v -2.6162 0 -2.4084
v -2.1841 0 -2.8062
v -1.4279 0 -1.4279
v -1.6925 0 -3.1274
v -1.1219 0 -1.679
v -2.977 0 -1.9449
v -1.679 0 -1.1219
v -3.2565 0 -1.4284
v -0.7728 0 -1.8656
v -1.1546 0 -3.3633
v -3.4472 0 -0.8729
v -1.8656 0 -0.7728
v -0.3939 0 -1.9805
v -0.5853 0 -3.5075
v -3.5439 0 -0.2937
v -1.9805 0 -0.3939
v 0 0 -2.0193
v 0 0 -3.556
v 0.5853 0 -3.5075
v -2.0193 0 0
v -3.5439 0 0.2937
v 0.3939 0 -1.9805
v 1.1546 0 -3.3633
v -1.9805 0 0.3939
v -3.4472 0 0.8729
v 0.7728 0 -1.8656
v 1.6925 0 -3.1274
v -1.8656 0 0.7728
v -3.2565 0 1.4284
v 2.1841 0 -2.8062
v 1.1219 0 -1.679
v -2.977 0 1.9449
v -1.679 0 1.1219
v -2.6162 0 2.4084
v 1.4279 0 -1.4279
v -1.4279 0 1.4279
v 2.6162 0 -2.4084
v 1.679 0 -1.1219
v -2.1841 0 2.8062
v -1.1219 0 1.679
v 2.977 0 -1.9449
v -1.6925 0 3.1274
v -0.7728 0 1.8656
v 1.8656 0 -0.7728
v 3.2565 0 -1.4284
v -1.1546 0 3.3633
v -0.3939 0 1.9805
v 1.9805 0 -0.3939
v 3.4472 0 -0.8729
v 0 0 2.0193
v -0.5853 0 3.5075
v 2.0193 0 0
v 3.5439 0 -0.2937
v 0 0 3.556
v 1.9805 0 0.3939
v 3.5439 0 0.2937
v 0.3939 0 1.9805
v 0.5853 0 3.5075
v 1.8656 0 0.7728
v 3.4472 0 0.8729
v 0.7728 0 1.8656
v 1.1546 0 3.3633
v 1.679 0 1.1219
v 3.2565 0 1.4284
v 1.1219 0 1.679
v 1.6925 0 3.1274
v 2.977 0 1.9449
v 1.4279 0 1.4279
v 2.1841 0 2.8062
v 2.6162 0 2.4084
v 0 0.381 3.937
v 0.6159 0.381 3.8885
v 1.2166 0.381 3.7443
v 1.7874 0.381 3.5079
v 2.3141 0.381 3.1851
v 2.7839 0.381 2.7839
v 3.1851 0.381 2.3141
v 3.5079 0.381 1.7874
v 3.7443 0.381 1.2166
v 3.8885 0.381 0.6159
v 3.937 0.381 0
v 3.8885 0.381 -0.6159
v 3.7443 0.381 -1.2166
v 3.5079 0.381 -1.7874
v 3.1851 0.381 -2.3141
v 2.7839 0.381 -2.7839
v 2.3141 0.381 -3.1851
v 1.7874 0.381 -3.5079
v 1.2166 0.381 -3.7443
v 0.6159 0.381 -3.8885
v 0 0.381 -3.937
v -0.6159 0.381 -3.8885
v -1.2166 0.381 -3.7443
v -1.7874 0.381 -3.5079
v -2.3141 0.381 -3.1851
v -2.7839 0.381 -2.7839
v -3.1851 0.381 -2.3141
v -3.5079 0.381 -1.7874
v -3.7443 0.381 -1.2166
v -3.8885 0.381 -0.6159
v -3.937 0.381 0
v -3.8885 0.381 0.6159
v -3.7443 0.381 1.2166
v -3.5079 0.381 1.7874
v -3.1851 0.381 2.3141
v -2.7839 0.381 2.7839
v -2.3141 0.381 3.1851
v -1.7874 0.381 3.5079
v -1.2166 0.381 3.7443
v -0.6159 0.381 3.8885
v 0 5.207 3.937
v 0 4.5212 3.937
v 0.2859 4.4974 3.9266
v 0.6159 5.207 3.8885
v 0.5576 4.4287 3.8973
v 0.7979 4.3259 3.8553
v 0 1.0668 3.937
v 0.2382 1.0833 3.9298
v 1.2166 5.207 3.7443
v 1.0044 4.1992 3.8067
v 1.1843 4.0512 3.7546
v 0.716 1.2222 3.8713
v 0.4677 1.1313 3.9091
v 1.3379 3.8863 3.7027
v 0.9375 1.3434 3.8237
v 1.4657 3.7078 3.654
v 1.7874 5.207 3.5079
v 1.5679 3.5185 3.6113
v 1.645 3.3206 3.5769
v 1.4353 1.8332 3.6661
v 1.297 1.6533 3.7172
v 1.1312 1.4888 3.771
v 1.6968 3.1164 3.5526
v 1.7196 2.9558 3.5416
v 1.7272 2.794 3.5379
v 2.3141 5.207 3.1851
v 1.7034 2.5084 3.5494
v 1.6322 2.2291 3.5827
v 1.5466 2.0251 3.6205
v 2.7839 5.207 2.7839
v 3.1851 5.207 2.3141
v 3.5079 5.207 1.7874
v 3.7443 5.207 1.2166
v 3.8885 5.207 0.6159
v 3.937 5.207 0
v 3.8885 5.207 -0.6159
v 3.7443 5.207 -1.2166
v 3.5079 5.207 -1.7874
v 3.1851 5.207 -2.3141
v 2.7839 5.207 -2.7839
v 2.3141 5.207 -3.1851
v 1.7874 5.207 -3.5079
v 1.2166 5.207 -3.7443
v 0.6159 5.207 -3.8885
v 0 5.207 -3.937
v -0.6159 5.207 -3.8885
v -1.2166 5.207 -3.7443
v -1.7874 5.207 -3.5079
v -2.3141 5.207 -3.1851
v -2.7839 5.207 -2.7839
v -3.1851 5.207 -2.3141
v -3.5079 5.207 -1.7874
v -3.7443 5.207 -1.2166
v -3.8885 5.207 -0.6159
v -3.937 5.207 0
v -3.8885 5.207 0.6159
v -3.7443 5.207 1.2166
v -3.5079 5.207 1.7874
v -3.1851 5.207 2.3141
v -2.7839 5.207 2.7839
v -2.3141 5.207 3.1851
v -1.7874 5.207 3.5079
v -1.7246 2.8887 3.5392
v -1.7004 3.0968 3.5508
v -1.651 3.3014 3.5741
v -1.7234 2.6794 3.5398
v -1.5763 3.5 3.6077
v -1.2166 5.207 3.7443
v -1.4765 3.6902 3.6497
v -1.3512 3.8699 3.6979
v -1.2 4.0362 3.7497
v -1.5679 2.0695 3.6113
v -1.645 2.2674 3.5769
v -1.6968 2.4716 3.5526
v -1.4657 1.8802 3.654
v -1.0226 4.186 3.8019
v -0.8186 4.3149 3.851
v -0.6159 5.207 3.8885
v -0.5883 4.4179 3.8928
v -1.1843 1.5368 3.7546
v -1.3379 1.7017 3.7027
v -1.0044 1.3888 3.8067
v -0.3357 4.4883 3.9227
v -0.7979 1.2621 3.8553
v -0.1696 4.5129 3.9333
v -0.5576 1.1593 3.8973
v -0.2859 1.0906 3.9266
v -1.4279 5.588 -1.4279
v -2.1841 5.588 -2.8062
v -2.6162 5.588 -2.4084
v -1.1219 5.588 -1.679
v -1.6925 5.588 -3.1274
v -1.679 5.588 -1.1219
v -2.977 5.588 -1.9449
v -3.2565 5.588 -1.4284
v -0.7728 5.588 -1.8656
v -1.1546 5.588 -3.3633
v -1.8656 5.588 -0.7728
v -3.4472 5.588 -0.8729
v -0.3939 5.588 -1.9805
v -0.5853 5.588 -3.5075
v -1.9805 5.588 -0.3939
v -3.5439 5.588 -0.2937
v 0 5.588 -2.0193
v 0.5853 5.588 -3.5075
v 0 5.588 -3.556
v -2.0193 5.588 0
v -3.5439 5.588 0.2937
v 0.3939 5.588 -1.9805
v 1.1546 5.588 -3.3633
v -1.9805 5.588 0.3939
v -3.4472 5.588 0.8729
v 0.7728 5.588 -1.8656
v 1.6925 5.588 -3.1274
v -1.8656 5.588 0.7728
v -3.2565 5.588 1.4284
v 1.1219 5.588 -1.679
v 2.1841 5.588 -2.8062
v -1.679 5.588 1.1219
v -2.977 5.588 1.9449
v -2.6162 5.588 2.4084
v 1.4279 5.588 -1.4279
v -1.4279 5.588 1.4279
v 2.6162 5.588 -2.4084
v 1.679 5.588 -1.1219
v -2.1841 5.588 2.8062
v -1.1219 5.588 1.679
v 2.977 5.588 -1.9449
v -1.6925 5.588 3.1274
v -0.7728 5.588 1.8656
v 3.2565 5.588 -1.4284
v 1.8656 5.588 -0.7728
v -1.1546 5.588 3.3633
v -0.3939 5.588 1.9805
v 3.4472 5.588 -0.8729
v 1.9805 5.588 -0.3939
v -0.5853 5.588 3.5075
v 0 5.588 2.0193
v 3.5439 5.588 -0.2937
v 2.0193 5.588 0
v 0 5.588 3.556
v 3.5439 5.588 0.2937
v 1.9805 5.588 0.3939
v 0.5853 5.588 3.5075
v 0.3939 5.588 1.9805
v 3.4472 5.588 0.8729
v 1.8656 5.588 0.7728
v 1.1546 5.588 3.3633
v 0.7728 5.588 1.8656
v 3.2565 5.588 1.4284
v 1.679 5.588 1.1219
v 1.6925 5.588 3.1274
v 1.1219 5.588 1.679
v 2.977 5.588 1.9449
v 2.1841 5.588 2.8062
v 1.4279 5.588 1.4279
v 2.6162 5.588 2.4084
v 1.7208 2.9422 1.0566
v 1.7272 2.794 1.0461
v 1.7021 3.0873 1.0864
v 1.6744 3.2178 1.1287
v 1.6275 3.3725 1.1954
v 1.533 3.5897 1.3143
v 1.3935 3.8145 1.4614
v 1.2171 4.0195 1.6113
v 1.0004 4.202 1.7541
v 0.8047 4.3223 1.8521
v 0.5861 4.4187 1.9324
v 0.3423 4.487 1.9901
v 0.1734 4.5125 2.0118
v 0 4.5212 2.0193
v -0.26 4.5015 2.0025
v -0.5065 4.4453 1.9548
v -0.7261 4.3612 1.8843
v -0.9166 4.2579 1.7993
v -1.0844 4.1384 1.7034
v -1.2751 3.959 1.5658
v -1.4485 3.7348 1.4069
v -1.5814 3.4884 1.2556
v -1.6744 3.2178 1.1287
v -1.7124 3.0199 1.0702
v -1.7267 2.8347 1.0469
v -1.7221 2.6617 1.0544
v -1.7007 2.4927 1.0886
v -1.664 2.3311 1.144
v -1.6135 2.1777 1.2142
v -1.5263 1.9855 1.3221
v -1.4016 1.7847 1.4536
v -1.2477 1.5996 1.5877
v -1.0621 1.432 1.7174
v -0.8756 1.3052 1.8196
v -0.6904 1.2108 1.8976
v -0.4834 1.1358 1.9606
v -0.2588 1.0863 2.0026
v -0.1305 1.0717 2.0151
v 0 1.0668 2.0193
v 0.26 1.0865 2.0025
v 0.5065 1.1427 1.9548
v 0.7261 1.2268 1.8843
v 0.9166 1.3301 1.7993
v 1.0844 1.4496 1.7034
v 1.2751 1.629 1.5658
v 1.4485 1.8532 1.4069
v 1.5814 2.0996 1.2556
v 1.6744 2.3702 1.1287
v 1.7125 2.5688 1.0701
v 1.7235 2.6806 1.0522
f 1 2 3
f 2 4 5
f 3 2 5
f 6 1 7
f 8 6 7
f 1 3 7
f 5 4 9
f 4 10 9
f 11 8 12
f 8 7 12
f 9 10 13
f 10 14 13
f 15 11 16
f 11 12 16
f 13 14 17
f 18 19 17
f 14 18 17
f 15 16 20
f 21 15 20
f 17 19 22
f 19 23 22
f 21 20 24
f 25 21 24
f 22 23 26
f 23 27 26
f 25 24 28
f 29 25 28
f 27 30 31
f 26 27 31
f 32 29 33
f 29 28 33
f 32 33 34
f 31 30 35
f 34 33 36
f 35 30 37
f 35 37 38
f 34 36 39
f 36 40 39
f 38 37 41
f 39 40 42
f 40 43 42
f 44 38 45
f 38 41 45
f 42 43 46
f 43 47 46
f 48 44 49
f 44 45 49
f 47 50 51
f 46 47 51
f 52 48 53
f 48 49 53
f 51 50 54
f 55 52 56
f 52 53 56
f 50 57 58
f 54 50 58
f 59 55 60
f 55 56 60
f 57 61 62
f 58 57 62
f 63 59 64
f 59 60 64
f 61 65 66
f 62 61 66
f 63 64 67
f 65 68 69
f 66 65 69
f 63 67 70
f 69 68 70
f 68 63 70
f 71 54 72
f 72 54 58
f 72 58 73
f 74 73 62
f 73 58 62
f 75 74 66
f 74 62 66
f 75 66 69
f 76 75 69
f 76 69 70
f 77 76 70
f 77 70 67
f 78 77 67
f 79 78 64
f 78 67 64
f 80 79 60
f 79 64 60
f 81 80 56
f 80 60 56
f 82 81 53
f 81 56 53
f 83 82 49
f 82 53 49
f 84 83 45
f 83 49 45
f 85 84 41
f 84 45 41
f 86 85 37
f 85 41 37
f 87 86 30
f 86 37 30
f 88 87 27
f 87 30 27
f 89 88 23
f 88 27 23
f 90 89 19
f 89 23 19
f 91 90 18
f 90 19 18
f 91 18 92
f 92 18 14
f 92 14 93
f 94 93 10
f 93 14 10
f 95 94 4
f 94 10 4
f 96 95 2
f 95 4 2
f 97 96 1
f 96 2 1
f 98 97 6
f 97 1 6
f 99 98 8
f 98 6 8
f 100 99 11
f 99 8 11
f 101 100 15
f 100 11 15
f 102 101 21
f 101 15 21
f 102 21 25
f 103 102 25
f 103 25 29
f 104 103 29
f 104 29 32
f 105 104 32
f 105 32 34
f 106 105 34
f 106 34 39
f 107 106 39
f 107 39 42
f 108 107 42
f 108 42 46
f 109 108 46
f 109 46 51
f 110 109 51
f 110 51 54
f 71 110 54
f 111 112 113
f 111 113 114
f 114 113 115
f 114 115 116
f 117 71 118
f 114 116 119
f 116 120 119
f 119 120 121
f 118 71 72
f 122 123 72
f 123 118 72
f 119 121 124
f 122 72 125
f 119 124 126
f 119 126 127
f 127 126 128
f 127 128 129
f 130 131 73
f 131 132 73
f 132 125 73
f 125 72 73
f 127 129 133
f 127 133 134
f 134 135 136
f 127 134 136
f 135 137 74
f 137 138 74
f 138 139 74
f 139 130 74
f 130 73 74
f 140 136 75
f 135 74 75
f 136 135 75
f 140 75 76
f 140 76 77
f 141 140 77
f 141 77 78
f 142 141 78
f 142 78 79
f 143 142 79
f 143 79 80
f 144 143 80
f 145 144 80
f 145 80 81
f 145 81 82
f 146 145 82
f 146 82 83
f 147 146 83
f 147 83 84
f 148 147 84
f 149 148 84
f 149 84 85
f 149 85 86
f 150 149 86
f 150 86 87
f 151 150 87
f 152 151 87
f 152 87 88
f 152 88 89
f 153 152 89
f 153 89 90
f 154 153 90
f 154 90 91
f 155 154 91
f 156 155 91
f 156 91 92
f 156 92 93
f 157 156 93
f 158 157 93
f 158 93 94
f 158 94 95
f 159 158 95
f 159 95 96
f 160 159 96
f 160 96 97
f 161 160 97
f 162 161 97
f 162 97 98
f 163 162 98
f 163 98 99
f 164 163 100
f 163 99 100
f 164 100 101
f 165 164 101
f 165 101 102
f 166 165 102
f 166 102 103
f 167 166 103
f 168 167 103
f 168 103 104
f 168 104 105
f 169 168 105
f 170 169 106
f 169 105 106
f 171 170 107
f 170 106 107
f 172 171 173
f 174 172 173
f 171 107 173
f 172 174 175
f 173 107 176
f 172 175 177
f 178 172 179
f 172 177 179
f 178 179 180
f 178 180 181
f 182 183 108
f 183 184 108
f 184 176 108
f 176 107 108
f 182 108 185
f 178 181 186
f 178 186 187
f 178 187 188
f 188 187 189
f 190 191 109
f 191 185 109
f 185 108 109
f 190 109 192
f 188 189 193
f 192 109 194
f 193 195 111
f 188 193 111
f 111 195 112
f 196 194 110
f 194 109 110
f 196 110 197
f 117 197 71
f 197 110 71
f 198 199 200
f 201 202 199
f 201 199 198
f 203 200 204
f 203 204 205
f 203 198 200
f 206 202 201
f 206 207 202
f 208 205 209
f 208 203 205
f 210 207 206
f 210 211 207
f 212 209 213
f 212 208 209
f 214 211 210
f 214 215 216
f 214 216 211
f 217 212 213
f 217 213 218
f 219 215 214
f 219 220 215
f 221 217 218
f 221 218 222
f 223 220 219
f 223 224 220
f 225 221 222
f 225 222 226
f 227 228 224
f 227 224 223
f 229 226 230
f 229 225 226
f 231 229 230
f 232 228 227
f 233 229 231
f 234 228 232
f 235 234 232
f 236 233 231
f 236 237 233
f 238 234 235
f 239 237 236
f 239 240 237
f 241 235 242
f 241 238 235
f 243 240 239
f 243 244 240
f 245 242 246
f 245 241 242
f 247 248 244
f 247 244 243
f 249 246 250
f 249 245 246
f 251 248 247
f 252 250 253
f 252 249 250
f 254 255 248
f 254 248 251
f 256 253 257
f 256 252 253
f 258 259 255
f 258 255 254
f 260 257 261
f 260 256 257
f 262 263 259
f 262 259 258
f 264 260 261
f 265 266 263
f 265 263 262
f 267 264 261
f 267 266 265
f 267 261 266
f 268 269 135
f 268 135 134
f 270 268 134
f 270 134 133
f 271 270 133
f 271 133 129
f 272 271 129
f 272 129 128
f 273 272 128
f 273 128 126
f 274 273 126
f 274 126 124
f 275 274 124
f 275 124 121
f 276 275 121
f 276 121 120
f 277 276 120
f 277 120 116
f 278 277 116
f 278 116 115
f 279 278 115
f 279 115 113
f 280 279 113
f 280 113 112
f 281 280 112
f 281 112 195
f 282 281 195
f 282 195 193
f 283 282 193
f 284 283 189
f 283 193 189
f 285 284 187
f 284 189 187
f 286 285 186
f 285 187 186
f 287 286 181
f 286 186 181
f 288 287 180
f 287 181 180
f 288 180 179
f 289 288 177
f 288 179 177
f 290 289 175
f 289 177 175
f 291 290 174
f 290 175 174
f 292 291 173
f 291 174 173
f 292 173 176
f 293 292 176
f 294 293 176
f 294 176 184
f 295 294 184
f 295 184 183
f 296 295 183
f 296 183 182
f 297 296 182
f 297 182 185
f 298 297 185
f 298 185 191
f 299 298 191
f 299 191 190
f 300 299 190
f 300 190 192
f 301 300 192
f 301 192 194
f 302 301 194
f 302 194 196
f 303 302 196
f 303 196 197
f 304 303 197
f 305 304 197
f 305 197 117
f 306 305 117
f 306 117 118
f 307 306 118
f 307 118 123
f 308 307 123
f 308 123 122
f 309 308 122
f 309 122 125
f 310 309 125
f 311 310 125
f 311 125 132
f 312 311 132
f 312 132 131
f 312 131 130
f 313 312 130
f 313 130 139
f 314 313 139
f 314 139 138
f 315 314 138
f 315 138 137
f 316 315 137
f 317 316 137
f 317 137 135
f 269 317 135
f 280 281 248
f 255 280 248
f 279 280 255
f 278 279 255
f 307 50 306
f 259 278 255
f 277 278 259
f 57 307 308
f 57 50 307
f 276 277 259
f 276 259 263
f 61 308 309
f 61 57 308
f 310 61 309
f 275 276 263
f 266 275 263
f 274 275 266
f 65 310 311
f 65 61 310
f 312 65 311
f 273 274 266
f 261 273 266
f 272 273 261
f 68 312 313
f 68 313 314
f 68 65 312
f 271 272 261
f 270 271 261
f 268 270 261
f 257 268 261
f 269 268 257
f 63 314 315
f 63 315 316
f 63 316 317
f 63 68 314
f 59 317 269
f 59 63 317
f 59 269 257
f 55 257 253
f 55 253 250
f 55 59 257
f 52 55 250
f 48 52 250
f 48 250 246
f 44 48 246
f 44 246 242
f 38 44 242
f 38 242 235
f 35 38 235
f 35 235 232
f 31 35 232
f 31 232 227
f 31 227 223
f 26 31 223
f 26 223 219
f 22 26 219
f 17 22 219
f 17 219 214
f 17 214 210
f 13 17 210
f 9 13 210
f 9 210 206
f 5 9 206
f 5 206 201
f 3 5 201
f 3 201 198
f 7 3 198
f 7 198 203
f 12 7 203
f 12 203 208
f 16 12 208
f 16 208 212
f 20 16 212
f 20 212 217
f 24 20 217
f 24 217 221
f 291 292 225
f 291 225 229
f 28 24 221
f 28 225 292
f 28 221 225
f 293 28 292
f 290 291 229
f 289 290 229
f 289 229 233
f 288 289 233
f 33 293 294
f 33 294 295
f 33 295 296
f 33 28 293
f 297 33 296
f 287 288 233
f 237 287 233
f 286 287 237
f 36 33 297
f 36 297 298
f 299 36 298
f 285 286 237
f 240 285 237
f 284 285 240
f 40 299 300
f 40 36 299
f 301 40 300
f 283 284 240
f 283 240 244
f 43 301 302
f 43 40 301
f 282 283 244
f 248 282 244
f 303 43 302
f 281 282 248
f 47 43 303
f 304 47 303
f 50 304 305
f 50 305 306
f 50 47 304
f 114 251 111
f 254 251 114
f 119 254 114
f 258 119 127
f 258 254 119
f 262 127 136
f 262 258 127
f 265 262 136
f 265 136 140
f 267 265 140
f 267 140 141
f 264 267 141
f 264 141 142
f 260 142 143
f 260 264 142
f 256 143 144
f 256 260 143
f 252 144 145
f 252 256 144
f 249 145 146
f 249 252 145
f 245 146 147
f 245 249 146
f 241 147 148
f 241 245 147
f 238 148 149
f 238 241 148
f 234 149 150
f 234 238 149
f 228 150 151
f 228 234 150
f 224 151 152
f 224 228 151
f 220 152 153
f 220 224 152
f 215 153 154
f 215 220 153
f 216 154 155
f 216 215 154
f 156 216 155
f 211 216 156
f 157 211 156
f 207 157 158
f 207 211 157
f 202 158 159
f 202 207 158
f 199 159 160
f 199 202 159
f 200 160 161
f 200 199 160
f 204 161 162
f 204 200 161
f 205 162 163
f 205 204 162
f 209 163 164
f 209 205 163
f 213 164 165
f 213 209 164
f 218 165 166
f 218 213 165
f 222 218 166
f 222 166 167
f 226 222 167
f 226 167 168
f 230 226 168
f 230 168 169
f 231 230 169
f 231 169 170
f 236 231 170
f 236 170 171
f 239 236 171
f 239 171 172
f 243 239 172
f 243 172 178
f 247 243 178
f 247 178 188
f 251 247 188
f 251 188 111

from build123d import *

# Parameters (mm, degrees)
SKETCH1_R                  = 3.937
SKETCH1_R_2                = 2.0193
BOSS_EXTRUDE1_DEPTH        = 5.588
F_8_32_TAPPED_HOLE1_REACH  = 11.236
F_8_32_TAPPED_HOLE1_BORE_R = 1.7272
CHAMFER1_SIZE              = 0.381


with BuildPart() as part:
    # Sketch1 → Boss-Extrude1 (new body)
    with BuildSketch(Plane(origin=(0, 0, 0), x_dir=(1, 0, 0), z_dir=(0, 1, 0))):
        with Locations(Location((0, 0, 0), (0, 0, 270))):
            Circle(SKETCH1_R)
        with Locations(Location((0, 0, 0), (0, 0, 270))):
            Circle(SKETCH1_R_2, mode=Mode.SUBTRACT)
    extrude(amount=BOSS_EXTRUDE1_DEPTH)

    # #8-32 Tapped Hole1 bore (on position points) → #8-32 Tapped Hole1 (cut, up to next)
    with BuildSketch(Plane(origin=(0, 2.794, 3.937), x_dir=(1, 0, 0), z_dir=(0, 0, 1)), mode=Mode.PRIVATE) as f_8_32_tapped_hole1_sk1:
        Circle(F_8_32_TAPPED_HOLE1_BORE_R)
    f_8_32_tapped_hole1_tool1 = extrude(f_8_32_tapped_hole1_sk1.sketch, amount=-F_8_32_TAPPED_HOLE1_REACH, mode=Mode.PRIVATE) & part.part
    add(f_8_32_tapped_hole1_tool1.solids().sort_by_distance((0, 2.794, 3.937))[0], mode=Mode.SUBTRACT)

    # Chamfer1
    chamfer1_edges = [part.edges().sort_by_distance(p)[0] for p in [
        (0, 0, -3.937),
        (0, 5.588, -3.937),
    ]]
    chamfer(chamfer1_edges, length=CHAMFER1_SIZE)


solid = part.part
